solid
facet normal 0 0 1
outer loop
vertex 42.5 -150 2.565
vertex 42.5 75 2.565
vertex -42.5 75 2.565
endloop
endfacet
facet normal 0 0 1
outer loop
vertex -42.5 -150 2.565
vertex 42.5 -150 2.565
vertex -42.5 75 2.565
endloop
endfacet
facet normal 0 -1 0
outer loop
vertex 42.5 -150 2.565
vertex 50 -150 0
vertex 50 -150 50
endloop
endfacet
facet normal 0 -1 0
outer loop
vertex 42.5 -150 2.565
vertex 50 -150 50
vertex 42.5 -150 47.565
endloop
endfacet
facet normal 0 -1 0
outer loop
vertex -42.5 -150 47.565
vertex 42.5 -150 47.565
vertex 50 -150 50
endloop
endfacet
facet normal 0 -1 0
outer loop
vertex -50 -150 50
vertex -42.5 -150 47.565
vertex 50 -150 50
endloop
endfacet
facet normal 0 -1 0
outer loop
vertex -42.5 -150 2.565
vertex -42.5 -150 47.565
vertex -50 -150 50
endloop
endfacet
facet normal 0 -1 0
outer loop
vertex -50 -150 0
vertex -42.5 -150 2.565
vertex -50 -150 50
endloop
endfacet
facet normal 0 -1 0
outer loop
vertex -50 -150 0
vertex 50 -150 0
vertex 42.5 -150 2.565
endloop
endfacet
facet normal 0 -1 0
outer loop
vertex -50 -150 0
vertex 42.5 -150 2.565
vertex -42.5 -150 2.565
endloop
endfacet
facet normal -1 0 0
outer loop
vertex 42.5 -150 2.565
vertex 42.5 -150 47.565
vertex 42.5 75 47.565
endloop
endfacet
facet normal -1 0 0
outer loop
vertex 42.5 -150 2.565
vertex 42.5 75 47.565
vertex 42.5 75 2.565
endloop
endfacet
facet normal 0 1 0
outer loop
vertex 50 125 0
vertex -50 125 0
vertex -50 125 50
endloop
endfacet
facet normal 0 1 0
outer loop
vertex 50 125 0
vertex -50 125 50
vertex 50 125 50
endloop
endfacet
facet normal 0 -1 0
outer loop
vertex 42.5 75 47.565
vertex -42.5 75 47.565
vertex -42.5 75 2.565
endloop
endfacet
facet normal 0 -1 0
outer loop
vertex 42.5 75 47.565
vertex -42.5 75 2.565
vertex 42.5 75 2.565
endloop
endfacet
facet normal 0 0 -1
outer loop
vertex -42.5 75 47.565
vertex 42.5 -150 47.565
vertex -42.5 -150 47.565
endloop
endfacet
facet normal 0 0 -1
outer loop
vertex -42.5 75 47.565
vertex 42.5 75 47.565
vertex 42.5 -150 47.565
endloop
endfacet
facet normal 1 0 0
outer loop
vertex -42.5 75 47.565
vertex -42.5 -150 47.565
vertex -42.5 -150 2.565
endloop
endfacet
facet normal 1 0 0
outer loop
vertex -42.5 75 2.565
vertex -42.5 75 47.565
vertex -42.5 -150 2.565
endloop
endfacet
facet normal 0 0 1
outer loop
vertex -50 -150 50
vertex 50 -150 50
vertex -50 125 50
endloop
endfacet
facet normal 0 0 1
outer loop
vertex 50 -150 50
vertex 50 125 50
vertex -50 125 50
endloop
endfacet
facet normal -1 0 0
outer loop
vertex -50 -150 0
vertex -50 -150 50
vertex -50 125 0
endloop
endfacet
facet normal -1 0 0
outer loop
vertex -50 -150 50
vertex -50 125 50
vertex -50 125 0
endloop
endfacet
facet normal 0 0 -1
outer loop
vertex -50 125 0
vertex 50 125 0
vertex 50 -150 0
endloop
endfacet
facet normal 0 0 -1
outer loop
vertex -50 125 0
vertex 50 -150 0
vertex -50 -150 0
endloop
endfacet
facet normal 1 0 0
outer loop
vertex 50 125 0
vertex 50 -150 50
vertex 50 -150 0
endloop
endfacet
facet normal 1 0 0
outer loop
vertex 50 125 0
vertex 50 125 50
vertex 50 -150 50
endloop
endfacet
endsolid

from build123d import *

# Parameters (mm, degrees)
SKETCH_W         = 100
SKETCH_H         = 250
PAD_DEPTH        = 50
SKETCH001_W      = 85
SKETCH001_H      = 45
POCKET_DEPTH     = 200
POCKET_FACE1_W   = 100
POCKET_FACE1_H   = 50
POCKET_FACE1_W_2 = 85
POCKET_FACE1_H_2 = 45
PAD001_DEPTH     = 25


with BuildPart() as part:
    # Sketch → Pad (new body)
    with BuildSketch(Plane.XY):
        Rectangle(SKETCH_W, SKETCH_H)
    extrude(amount=PAD_DEPTH)

    # Sketch001 (on Face1 of Pad) → Pocket (cut)
    with BuildSketch(Plane.XZ.offset(125)):
        with Locations((0, 25.06513)):
            Rectangle(SKETCH001_W, SKETCH001_H)
    extrude(amount=-POCKET_DEPTH, mode=Mode.SUBTRACT)

    # Pocket Face1 → Pad001 (add)
    with BuildSketch(Plane(origin=(0, -125, 24.787981), x_dir=(-1, 0, 0), z_dir=(0, -1, 0))):
        with Locations((0, -0.212019)):
            Rectangle(POCKET_FACE1_W, POCKET_FACE1_H)
        with Locations((0, -0.277149)):
            Rectangle(POCKET_FACE1_W_2, POCKET_FACE1_H_2, mode=Mode.SUBTRACT)
    extrude(amount=PAD001_DEPTH)


solid = part.part
